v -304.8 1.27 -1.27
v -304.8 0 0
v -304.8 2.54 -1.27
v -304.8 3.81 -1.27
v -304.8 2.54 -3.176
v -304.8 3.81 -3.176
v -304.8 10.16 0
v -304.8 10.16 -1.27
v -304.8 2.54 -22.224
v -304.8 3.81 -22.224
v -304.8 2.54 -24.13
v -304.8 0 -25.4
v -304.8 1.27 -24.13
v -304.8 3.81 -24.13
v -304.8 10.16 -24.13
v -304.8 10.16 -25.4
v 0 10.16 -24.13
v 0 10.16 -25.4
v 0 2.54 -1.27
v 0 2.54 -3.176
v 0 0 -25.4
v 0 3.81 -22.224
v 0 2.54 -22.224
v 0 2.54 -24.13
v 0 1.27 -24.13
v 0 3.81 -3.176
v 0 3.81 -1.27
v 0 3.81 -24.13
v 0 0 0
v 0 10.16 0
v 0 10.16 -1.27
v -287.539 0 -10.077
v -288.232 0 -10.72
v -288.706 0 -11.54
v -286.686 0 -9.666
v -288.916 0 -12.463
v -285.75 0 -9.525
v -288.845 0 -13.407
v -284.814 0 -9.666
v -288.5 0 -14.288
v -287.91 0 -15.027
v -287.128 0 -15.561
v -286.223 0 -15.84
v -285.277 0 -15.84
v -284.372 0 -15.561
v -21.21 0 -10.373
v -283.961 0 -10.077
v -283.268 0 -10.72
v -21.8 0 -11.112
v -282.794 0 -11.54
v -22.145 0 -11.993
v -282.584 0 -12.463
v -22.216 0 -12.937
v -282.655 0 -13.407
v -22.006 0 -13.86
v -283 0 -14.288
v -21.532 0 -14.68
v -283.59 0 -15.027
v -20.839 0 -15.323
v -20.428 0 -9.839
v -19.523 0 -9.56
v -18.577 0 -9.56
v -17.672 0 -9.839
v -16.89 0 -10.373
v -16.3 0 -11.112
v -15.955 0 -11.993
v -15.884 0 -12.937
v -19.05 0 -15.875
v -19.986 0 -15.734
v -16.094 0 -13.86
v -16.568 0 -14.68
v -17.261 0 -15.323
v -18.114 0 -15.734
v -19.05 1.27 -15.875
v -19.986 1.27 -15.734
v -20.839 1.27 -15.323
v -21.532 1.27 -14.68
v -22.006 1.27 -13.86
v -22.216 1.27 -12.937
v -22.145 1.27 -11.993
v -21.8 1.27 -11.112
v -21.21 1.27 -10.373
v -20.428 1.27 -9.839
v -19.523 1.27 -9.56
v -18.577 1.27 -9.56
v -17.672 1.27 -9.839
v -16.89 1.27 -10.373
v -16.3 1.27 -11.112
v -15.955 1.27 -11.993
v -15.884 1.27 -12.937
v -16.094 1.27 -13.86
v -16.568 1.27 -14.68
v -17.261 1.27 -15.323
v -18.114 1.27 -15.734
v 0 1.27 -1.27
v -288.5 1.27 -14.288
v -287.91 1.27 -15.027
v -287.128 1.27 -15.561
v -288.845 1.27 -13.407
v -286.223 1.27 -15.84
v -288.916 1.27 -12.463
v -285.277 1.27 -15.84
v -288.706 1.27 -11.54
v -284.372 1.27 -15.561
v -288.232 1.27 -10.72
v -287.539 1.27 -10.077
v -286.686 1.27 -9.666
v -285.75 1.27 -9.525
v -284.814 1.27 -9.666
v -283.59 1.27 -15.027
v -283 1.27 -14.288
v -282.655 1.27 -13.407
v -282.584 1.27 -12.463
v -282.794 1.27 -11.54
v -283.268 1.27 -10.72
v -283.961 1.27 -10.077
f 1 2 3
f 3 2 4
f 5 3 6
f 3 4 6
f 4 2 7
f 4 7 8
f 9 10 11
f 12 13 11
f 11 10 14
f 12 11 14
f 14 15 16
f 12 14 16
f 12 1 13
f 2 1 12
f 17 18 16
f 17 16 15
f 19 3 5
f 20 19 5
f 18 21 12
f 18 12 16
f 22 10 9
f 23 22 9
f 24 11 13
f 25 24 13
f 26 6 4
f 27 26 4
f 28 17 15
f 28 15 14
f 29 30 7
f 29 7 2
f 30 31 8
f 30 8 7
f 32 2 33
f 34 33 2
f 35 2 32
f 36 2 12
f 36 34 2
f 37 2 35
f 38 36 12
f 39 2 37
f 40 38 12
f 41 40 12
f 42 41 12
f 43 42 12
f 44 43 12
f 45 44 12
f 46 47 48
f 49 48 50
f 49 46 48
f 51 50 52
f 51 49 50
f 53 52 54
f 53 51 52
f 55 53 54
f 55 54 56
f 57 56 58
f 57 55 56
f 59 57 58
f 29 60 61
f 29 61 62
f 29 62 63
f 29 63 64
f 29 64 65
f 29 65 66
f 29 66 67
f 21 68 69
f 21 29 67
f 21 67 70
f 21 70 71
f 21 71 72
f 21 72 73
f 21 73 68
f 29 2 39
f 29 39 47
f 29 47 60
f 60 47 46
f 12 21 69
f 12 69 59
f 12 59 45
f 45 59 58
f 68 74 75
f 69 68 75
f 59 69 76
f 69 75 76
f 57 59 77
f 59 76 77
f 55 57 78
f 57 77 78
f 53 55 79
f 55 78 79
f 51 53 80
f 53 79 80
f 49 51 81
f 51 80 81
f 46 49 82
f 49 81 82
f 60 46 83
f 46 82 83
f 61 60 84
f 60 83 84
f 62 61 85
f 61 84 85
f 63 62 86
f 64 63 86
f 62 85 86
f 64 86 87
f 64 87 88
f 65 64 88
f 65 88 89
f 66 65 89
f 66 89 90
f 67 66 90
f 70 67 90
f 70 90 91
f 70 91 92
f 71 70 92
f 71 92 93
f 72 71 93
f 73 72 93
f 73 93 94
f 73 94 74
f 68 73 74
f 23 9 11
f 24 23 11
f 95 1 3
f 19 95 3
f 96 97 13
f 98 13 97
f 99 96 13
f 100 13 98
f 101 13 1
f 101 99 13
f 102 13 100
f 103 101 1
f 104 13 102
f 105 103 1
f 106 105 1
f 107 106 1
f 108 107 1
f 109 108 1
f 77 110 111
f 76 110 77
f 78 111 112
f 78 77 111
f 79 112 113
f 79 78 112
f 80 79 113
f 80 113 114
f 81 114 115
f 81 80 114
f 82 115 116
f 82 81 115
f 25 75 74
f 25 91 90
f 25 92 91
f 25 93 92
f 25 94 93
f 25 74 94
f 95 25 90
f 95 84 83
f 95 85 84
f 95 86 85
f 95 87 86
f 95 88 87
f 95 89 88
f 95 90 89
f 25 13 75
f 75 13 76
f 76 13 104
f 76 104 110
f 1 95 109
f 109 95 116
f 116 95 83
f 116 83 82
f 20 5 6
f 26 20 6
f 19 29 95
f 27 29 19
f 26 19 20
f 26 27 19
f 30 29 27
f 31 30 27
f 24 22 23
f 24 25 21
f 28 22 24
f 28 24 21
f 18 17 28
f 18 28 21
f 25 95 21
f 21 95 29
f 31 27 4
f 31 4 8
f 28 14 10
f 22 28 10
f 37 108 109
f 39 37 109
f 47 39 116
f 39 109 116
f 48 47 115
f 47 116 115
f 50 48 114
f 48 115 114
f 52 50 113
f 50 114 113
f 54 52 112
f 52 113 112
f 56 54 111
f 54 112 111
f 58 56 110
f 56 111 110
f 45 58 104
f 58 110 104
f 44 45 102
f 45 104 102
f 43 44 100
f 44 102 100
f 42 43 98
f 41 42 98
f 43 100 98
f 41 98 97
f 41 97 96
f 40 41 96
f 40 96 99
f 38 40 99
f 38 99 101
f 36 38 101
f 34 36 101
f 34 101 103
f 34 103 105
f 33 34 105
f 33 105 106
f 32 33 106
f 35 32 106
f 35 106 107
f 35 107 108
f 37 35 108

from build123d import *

# Parameters (mm, degrees)
BOSS_EXTRUDE1_DEPTH = 304.8
SKETCH2_R           = 3.175
CUT_EXTRUDE2_DEPTH  = 306.985673031


with BuildPart() as part:
    # Sketch1 → Boss-Extrude1 (new body)
    with BuildSketch(Plane(origin=(0, 0, 0), x_dir=(0, 0, -1), z_dir=(1, 0, 0))):
        Polygon((0, 0), (25.4, 0), (25.4, 10.16), (24.13, 10.16), (24.13, 3.81), (22.224108836, 3.81), (22.224108836, 2.54), (24.13, 2.54), (24.13, 1.27), (1.27, 1.27), (1.27, 2.54), (3.175891164, 2.54), (3.175891164, 3.81), (1.27, 3.81), (1.27, 10.16), (0, 10.16), align=None)
    extrude(amount=-BOSS_EXTRUDE1_DEPTH)

    # Sketch2 → Cut-Extrude2 (cut, through all)
    with BuildSketch(Plane(origin=(0, 1.27, 0), x_dir=(1, 0, 0), z_dir=(0, 1, 0))):
        with Locations(Location((-285.75, 12.7, 0), (0, 0, 270))):
            Circle(SKETCH2_R)
        with Locations(Location((-19.05, 12.7, 0), (0, 0, 90))):
            Circle(SKETCH2_R)
    extrude(amount=-CUT_EXTRUDE2_DEPTH, mode=Mode.SUBTRACT)


solid = part.part
